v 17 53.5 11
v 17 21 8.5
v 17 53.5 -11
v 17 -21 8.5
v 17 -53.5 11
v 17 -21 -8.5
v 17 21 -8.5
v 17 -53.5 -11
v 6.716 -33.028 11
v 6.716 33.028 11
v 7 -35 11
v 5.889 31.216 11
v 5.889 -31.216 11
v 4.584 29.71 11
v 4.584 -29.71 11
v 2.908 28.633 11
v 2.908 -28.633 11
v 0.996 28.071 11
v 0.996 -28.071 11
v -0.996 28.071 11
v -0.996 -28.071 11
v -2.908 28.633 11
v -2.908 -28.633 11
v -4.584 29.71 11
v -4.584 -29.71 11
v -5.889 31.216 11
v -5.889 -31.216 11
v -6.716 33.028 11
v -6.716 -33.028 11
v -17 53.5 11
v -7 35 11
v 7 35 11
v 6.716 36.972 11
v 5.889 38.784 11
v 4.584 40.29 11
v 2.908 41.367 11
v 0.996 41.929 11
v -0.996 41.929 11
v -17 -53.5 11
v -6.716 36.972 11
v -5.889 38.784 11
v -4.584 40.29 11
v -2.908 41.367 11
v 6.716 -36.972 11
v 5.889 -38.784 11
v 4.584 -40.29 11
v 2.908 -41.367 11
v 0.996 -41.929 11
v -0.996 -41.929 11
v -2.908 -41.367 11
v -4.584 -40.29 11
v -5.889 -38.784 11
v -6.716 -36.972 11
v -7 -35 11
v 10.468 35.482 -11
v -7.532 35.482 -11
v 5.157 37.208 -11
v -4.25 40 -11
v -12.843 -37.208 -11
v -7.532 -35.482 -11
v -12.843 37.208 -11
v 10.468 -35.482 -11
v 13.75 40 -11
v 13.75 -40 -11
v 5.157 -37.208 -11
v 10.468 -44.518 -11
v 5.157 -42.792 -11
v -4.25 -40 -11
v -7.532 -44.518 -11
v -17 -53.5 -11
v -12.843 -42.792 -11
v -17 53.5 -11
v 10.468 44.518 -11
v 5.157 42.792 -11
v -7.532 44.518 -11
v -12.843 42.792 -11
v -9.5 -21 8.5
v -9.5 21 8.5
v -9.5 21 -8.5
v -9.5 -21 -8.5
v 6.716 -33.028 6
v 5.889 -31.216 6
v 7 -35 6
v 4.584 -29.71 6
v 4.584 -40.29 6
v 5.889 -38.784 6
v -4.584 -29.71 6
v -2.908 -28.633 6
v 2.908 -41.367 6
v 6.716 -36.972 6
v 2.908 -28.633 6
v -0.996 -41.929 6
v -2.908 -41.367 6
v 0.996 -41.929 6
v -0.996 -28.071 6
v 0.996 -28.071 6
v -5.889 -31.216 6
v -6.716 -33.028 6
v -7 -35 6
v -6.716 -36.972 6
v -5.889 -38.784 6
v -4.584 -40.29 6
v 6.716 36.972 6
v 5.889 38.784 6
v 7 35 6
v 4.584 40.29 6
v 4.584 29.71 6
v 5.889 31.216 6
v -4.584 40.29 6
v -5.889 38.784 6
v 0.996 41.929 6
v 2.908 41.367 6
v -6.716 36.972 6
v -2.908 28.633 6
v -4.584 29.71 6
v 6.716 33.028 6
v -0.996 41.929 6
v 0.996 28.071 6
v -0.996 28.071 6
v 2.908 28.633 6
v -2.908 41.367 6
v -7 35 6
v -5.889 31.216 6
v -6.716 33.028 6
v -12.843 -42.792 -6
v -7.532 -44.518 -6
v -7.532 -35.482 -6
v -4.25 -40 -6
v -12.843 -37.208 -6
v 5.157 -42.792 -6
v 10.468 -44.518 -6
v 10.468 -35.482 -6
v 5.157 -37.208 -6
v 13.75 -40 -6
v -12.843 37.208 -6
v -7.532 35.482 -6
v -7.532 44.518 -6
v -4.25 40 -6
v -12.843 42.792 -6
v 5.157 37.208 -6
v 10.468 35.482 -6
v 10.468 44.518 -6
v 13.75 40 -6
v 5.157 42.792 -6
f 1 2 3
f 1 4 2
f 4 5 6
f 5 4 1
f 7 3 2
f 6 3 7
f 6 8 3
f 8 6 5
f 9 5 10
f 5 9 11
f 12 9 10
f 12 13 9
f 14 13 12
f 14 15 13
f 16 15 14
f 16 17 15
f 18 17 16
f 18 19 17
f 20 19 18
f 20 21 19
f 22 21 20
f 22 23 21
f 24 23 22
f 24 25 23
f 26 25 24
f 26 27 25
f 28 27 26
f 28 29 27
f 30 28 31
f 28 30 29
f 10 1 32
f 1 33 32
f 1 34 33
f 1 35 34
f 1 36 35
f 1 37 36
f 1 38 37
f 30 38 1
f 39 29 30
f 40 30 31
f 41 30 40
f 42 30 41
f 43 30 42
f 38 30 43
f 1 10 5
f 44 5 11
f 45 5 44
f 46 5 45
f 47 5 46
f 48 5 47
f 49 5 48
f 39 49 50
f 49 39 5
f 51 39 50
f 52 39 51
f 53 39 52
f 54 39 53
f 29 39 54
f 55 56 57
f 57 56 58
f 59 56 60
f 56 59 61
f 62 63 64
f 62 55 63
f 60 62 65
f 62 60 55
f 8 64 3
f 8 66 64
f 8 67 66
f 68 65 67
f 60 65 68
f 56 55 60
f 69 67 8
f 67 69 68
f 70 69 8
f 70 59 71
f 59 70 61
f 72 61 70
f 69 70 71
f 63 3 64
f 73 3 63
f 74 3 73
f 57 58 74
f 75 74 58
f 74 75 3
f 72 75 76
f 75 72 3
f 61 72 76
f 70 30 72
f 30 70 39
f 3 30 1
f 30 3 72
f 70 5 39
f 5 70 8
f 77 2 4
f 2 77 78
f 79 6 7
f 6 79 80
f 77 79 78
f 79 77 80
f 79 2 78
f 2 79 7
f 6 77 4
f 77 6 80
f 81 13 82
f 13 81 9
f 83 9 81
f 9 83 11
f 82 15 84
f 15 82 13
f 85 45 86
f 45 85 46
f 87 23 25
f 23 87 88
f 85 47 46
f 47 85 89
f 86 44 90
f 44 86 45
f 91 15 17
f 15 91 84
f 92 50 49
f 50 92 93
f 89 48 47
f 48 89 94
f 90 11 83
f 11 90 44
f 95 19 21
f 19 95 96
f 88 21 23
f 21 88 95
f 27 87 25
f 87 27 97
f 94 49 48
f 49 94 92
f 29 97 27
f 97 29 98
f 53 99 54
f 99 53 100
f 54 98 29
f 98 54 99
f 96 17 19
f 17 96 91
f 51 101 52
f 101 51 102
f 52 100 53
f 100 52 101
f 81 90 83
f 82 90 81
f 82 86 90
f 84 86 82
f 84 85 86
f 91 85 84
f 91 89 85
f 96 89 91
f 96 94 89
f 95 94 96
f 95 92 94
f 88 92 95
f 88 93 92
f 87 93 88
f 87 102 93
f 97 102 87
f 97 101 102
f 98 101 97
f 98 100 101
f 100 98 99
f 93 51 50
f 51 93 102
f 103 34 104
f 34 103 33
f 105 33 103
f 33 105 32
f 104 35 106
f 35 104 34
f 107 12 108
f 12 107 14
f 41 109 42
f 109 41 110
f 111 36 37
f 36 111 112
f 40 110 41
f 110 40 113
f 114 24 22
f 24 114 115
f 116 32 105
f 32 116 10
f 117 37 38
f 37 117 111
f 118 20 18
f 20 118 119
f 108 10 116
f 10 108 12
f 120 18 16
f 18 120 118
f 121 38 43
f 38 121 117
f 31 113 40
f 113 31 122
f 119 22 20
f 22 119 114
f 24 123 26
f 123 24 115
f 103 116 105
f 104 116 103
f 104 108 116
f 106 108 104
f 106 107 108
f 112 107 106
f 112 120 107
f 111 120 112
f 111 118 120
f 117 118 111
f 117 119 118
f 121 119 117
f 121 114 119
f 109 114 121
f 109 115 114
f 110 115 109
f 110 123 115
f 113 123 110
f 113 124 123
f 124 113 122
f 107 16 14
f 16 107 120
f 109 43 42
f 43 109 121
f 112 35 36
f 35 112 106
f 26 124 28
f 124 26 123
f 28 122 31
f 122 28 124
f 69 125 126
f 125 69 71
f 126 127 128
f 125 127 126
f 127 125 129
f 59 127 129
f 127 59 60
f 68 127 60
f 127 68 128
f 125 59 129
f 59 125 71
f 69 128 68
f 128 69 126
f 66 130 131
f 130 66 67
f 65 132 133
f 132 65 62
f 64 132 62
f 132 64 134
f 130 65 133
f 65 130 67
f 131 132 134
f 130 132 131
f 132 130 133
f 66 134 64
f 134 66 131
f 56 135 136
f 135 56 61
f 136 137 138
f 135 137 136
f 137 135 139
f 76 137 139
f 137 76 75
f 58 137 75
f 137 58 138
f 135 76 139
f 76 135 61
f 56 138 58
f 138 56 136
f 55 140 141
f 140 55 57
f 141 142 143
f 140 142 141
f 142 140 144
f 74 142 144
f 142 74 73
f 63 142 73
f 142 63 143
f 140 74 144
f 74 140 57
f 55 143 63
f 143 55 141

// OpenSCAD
difference(){cube([34,107,22],center=true);
translate([4.5,0,0])cube([28,42,17],center=true);
translate([0,-35,6])cylinder(10,7,7);
translate([0,35,6])cylinder(10,7,7);

translate([-9,-40,-13])cylinder(7,4.75,4.75, $fn=5);

translate([9,-40,-13])cylinder(7,4.75,4.75, $fn=5);

translate([-9,40,-13])cylinder(7,4.75,4.75, $fn=5);

translate([9,40,-13])cylinder(7,4.75,4.75, $fn=5);}
